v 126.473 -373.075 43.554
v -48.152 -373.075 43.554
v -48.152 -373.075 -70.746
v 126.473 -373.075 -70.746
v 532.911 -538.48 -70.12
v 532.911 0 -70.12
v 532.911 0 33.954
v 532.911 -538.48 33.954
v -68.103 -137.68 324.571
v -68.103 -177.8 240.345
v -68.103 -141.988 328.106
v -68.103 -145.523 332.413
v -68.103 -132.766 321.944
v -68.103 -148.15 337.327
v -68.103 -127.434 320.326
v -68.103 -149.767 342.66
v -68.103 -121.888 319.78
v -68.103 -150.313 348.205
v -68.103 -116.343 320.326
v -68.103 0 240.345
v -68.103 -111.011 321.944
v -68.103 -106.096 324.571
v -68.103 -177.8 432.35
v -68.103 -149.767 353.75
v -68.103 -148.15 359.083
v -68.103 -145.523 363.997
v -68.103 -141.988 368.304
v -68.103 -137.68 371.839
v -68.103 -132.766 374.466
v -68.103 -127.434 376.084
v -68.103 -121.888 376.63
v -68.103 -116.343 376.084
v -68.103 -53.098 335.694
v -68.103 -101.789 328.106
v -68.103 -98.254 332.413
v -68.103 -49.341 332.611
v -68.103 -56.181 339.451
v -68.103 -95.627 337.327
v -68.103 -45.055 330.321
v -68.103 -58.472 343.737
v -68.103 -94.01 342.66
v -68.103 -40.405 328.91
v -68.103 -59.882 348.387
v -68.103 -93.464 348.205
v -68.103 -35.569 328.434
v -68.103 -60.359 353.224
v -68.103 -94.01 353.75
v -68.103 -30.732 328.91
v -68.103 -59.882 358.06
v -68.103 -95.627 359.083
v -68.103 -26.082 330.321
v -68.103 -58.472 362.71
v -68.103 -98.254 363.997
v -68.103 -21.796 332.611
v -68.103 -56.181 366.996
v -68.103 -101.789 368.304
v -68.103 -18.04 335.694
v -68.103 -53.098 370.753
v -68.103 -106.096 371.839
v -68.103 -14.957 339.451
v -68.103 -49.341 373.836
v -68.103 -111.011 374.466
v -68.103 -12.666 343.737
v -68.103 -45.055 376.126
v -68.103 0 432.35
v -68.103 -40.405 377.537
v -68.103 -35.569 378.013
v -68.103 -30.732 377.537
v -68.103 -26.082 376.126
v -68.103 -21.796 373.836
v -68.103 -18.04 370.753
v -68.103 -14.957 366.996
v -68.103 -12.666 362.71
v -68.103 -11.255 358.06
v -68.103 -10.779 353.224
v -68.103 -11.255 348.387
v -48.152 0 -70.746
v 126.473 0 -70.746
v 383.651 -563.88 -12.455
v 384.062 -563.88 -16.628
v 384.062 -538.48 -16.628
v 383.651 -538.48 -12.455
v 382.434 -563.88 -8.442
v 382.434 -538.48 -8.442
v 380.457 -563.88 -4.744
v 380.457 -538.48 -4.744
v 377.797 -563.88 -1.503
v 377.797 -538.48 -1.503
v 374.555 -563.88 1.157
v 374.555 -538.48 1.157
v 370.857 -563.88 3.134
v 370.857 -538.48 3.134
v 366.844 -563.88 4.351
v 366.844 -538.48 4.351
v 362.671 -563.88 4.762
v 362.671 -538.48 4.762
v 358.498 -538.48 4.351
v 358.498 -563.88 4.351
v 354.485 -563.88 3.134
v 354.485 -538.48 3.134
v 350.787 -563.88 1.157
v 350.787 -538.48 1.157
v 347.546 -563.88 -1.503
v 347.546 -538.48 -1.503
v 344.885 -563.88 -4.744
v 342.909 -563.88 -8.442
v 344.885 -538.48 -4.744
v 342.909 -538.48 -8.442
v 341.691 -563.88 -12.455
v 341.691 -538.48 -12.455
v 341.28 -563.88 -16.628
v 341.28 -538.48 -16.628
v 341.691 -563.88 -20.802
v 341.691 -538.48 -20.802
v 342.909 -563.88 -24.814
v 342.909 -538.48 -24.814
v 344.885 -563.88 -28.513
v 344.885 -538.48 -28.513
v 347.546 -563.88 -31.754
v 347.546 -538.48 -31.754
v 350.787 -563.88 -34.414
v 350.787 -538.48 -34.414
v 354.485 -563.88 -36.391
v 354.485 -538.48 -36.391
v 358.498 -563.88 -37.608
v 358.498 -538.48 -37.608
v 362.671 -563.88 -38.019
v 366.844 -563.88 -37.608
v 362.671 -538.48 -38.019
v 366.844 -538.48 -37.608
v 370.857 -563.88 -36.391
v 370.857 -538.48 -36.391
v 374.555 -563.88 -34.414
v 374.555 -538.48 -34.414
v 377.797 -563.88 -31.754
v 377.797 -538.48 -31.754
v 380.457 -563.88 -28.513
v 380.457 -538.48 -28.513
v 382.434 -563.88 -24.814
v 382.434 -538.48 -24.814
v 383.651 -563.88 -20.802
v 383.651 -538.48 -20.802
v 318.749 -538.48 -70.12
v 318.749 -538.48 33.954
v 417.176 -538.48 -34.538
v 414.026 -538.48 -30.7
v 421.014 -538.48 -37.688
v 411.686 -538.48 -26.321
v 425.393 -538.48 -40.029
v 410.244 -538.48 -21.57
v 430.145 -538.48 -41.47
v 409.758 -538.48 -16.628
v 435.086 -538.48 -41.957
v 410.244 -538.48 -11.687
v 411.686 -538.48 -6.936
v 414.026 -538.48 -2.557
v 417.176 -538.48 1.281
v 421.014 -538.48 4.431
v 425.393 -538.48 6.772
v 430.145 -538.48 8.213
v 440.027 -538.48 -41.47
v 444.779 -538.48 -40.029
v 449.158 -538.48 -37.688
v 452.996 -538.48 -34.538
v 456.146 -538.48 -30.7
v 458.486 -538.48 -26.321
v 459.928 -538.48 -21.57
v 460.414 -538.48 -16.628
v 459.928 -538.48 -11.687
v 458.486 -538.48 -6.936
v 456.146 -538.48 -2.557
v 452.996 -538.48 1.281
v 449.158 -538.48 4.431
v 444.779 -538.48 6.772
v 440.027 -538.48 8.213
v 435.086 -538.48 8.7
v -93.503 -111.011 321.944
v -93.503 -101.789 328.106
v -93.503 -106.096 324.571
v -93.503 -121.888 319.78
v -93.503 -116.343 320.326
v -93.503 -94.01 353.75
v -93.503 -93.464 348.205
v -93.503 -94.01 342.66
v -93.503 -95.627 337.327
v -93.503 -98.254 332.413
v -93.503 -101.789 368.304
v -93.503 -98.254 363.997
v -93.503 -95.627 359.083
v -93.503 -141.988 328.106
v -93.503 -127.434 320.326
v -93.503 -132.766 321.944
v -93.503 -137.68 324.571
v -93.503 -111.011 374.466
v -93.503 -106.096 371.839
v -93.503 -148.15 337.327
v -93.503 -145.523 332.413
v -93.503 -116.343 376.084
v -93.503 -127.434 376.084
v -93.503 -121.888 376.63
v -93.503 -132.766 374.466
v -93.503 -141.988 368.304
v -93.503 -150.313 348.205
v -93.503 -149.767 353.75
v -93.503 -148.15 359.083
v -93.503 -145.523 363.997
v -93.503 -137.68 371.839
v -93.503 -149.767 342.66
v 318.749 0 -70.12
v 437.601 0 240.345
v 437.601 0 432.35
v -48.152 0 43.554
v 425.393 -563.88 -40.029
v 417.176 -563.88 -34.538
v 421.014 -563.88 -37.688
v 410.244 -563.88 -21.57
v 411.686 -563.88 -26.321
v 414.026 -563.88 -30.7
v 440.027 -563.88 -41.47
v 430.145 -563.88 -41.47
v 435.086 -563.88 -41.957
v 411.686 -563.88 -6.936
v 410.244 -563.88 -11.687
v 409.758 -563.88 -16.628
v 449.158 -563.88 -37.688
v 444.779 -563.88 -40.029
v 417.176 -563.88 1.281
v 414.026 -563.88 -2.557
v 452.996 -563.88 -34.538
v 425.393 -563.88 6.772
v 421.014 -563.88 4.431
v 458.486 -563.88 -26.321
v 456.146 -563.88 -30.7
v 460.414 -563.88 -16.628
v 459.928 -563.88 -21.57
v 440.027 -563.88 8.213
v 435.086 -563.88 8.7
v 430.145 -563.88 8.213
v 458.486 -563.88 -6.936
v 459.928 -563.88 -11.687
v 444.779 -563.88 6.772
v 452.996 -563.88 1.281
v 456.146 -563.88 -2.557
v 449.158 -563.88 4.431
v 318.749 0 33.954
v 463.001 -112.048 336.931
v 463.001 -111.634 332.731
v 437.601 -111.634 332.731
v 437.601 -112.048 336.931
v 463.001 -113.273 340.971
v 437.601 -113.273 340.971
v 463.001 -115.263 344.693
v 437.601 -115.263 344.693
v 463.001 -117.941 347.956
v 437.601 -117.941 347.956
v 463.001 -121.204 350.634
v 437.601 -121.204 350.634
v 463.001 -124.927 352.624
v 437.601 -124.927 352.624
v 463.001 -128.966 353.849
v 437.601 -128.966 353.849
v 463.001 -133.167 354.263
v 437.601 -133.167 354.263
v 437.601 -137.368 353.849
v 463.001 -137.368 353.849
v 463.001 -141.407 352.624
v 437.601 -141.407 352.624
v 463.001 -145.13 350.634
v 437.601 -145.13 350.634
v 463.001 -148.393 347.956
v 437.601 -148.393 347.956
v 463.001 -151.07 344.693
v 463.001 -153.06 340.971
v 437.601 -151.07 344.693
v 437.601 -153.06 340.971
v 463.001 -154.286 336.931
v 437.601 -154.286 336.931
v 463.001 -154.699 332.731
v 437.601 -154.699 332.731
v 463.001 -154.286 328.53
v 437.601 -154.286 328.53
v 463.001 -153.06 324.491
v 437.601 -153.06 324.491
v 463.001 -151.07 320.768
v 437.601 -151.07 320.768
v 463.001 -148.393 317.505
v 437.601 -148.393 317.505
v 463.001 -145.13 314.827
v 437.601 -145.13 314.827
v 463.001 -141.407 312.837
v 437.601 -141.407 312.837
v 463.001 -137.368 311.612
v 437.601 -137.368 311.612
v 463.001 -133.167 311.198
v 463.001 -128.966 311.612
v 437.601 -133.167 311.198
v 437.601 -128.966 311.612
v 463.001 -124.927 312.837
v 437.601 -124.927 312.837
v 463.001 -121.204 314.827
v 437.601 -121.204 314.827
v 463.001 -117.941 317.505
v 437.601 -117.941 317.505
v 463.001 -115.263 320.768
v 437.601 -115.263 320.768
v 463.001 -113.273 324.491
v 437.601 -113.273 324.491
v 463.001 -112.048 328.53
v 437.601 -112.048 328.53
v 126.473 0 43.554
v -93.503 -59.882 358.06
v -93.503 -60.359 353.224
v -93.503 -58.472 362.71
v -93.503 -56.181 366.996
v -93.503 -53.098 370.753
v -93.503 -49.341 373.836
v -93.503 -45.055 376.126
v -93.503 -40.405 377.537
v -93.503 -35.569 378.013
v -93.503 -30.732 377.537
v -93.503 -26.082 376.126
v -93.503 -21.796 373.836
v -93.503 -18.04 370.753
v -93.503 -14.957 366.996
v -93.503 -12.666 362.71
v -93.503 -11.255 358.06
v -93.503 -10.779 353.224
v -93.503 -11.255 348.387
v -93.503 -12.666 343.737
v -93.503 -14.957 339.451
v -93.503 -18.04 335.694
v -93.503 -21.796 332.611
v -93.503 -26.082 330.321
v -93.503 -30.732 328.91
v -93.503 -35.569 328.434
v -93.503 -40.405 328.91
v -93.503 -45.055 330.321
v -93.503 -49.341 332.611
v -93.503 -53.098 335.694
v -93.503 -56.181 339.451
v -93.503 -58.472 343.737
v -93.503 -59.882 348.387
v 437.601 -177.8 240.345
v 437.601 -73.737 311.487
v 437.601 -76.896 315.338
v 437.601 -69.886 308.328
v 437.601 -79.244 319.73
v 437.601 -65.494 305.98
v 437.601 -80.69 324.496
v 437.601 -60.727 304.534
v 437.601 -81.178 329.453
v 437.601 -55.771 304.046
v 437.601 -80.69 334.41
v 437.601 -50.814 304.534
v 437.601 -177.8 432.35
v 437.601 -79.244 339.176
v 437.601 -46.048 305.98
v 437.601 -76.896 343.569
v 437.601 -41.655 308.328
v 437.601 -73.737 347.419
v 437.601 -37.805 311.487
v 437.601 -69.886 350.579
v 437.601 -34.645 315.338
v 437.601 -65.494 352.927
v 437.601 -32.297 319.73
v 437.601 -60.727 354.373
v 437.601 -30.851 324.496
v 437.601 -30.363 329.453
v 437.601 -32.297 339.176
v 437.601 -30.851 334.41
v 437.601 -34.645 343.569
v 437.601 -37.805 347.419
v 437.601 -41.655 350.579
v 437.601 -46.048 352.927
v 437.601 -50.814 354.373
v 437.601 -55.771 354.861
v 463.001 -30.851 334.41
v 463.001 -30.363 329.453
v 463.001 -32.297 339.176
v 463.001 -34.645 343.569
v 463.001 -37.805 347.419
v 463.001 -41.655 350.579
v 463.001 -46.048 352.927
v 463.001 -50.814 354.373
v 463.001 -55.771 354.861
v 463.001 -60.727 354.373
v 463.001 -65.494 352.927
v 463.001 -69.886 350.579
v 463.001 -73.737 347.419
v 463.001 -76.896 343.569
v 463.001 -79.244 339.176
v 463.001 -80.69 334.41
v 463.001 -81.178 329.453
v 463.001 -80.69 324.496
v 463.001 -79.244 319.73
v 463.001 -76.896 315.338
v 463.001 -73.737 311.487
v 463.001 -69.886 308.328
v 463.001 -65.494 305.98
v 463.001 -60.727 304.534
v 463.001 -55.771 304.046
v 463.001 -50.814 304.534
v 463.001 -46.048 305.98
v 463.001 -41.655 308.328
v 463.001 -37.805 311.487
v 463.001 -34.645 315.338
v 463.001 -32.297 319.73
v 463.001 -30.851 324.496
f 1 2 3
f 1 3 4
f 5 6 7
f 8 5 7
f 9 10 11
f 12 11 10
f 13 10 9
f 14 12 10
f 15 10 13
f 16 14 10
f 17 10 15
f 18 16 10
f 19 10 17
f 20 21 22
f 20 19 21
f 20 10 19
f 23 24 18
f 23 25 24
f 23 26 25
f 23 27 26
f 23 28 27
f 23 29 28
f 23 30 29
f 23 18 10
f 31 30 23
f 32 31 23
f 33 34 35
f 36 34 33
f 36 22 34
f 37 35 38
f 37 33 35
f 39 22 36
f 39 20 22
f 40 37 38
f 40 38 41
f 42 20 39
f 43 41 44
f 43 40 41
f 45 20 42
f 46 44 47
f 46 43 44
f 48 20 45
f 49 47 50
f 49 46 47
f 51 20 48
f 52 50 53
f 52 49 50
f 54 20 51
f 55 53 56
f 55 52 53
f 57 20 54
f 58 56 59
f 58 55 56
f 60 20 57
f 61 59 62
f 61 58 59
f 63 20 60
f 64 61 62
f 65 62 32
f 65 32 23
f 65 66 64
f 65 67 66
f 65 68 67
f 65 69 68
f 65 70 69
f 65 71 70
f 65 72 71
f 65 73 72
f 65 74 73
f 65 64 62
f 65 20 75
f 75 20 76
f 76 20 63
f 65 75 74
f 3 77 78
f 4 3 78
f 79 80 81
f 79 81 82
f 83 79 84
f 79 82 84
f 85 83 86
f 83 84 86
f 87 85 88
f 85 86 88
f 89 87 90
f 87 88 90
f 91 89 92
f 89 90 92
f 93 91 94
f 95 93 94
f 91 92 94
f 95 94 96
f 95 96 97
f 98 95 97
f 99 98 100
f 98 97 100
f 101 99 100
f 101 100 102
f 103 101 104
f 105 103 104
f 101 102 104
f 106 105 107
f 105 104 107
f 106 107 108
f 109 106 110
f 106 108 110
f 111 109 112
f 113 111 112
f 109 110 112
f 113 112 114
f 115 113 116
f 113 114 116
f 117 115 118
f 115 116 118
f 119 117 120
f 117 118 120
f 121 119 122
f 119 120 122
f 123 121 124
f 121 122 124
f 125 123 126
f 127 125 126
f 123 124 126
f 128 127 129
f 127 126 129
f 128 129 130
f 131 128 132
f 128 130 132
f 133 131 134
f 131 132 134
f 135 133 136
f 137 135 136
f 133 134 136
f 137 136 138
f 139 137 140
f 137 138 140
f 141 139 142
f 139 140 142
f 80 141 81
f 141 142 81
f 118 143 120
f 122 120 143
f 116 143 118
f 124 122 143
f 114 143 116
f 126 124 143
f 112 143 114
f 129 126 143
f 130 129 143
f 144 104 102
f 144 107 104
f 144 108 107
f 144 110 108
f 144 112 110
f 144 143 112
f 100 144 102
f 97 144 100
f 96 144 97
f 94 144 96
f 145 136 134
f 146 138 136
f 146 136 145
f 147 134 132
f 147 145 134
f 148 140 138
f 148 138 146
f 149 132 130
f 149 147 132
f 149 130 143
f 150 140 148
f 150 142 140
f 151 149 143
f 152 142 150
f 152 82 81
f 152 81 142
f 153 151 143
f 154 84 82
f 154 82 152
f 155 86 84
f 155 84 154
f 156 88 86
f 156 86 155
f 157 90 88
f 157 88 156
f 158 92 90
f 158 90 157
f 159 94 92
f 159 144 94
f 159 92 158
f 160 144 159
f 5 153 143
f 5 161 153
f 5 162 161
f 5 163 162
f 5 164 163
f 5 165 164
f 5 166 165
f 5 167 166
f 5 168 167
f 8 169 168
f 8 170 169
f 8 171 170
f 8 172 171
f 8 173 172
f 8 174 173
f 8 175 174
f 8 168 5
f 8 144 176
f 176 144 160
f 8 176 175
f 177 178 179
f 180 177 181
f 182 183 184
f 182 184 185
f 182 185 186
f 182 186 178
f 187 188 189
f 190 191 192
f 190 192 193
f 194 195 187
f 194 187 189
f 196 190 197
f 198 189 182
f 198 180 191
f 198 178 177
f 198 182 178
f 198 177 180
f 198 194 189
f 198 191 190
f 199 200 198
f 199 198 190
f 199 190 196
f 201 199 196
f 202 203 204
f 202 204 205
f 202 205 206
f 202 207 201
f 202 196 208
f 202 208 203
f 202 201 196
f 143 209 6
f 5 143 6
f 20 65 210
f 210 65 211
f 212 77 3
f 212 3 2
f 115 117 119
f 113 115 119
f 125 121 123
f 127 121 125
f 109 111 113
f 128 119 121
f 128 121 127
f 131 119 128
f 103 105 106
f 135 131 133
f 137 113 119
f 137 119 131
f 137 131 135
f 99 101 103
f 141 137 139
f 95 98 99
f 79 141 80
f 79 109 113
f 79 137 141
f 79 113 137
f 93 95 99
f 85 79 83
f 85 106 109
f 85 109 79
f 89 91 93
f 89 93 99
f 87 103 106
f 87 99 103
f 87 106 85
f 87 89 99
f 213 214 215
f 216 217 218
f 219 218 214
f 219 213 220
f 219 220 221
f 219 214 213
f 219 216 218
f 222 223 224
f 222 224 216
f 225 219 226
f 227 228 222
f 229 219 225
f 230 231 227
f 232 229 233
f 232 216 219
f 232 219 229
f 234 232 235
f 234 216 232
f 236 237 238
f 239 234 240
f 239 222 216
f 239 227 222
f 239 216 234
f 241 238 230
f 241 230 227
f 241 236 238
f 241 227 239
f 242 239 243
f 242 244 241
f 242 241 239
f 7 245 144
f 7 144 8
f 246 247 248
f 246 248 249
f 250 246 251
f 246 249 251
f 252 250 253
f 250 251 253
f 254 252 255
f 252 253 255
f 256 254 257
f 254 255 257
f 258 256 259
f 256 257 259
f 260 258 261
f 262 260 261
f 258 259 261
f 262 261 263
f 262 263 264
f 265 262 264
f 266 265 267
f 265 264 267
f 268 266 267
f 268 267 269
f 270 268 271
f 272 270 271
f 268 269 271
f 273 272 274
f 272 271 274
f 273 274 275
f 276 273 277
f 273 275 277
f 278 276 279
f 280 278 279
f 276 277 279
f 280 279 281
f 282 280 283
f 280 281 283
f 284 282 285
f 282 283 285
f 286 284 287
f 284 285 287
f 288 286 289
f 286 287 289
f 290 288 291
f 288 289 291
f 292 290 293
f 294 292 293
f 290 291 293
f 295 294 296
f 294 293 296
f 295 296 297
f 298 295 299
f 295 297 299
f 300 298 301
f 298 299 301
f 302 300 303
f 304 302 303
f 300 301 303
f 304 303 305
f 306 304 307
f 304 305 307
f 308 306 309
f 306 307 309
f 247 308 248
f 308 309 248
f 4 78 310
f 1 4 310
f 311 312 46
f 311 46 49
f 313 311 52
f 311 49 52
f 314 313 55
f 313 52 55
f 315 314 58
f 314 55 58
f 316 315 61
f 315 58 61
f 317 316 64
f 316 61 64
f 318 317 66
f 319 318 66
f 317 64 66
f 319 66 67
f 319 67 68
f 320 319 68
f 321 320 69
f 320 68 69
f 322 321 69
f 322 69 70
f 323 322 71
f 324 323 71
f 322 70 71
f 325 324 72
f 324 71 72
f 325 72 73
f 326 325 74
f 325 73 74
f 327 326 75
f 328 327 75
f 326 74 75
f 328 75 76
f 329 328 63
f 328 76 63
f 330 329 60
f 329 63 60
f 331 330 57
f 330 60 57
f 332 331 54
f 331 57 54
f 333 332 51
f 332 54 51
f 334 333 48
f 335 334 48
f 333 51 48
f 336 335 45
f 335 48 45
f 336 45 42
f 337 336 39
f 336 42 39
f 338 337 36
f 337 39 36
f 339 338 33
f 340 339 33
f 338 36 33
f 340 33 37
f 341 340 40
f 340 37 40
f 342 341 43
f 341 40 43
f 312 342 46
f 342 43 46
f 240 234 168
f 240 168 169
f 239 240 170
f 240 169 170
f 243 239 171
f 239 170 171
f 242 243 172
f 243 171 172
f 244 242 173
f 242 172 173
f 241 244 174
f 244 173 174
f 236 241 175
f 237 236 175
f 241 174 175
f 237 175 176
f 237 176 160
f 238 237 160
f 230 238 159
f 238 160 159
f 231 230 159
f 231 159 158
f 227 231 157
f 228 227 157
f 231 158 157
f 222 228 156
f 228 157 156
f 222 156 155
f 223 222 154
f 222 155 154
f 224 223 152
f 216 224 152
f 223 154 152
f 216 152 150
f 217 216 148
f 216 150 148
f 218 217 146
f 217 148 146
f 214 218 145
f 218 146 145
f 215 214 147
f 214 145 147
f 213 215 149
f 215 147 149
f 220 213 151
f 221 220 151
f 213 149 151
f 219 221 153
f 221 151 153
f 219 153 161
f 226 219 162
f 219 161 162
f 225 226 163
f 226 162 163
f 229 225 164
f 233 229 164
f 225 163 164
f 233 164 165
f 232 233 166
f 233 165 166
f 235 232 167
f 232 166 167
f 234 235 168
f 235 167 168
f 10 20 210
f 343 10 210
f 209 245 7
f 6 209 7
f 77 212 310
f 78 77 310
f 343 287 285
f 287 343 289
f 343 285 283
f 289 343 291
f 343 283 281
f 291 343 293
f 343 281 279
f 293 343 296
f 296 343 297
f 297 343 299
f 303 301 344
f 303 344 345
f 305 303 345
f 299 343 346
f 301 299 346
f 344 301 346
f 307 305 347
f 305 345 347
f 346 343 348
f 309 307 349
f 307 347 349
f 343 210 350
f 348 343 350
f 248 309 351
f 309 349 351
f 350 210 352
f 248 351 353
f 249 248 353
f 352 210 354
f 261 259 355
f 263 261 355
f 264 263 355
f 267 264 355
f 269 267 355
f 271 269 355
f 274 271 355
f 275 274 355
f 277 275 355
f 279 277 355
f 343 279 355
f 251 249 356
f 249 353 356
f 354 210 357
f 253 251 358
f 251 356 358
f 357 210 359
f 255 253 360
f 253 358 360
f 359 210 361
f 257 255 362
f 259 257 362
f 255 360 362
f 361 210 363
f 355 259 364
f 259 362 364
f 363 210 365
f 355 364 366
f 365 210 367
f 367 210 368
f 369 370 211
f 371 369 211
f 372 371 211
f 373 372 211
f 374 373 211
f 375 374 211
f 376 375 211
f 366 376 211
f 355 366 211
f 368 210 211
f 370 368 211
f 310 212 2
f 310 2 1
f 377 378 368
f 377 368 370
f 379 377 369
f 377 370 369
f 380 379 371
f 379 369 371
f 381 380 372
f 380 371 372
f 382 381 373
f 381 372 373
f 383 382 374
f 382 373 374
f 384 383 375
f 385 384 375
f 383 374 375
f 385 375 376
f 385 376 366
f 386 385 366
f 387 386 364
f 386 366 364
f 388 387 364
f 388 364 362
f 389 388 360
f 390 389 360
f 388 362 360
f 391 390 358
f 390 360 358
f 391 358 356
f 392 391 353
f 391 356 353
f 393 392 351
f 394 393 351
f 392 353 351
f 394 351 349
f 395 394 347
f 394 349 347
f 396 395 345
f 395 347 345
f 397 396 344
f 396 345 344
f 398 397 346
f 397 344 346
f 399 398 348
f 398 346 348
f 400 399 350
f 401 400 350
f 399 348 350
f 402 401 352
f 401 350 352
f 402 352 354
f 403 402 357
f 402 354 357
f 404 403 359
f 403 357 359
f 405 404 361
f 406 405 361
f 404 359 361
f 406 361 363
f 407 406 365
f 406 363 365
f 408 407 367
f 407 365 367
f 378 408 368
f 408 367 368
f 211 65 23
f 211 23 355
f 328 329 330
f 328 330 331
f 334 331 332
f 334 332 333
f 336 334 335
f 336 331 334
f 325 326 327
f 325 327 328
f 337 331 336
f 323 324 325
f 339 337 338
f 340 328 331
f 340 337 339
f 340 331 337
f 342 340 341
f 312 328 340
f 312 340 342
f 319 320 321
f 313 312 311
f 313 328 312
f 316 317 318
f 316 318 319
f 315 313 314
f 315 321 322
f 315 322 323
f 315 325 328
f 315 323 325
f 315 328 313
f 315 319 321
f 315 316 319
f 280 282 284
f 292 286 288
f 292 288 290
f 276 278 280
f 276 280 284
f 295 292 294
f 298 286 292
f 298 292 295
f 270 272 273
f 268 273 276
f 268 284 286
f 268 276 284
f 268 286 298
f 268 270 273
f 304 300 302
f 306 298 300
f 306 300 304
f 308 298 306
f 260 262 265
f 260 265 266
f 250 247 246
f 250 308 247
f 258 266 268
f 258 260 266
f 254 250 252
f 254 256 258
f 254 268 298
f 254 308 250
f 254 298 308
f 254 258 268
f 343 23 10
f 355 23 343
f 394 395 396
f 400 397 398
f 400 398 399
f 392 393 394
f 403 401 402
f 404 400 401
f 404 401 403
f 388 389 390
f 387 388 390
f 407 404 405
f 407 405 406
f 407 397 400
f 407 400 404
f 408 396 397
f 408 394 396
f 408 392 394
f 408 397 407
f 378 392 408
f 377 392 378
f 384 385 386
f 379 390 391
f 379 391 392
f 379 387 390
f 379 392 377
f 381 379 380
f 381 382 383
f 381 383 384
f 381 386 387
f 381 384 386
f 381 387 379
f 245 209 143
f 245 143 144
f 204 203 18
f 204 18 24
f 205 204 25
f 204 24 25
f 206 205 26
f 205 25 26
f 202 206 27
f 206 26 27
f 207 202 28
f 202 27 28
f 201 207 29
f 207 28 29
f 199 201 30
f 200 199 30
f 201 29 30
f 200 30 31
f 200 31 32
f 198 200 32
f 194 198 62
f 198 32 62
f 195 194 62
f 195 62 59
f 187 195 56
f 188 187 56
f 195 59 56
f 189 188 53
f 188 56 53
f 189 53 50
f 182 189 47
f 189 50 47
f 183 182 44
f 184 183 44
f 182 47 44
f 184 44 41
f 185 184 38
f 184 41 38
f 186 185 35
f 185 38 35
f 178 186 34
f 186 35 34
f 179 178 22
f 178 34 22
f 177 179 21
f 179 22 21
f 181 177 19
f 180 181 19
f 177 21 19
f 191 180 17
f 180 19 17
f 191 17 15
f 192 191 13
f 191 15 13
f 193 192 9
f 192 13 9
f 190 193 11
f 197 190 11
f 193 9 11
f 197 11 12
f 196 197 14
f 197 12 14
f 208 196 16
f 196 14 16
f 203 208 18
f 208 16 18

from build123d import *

# Parameters (mm, degrees)
F0_W      = 174.625
F0_H      = 114.3
F1_DEPTH  = 373.0752
F2_W      = 214.162111
F2_H      = 104.073152
F3_DEPTH  = 538.48
F4_R      = 21.390859
F4_R_2    = 25.328398
F5_DEPTH  = 25.4
F6_W      = 505.703956
F6_H      = 192.005247
F7_DEPTH  = 177.8
F8_R      = 24.789963
F8_R_2    = 28.424876
F9_DEPTH  = 25.4
F10_R     = 21.532551
F10_R_2   = 25.407624
F11_DEPTH = 25.4


with BuildPart() as f1:
    # F0 (on Front) → F1 (new body)
    with BuildSketch(Plane.XZ):
        with Locations((39.160911, -13.595684)):
            Rectangle(F0_W, F0_H)
    extrude(amount=F1_DEPTH)


with BuildPart() as f3:
    # F2 (on Front) → F3 (new body)
    with BuildSketch(Plane.XZ):
        with Locations((425.830125, -18.082999)):
            Rectangle(F2_W, F2_H)
    extrude(amount=F3_DEPTH)

    # F4 (on face) → F5 (join)
    with BuildSketch(Plane.XZ.offset(538.48)):
        with Locations((362.671256, -16.628383)):
            Circle(F4_R)
        with Locations((435.085922, -16.628383)):
            Circle(F4_R_2)
    extrude(amount=F5_DEPTH)


with BuildPart() as f7:
    # F6 (on Front) → F7 (new body)
    with BuildSketch(Plane.XZ):
        with Locations((184.748754, 336.347222)):
            Rectangle(F6_W, F6_H)
    extrude(amount=F7_DEPTH)

    # F8 (on face) → F9 (join)
    with BuildSketch(Plane(origin=(-68.103224, 0, 0), x_dir=(0, -1, 0), z_dir=(-1, 0, 0))):
        with Locations((35.56877, 353.223503)):
            Circle(F8_R)
        with Locations((121.888414, 348.204941)):
            Circle(F8_R_2)
    extrude(amount=F9_DEPTH)

    # F10 (on face) → F11 (join)
    with BuildSketch(Plane.YZ.offset(437.600732)):
        with Locations((-133.16673, 332.730651)):
            Circle(F10_R)
        with Locations((-55.770636, 329.45326)):
            Circle(F10_R_2)
    extrude(amount=F11_DEPTH)


solid = Compound([f1.part, f3.part, f7.part])
